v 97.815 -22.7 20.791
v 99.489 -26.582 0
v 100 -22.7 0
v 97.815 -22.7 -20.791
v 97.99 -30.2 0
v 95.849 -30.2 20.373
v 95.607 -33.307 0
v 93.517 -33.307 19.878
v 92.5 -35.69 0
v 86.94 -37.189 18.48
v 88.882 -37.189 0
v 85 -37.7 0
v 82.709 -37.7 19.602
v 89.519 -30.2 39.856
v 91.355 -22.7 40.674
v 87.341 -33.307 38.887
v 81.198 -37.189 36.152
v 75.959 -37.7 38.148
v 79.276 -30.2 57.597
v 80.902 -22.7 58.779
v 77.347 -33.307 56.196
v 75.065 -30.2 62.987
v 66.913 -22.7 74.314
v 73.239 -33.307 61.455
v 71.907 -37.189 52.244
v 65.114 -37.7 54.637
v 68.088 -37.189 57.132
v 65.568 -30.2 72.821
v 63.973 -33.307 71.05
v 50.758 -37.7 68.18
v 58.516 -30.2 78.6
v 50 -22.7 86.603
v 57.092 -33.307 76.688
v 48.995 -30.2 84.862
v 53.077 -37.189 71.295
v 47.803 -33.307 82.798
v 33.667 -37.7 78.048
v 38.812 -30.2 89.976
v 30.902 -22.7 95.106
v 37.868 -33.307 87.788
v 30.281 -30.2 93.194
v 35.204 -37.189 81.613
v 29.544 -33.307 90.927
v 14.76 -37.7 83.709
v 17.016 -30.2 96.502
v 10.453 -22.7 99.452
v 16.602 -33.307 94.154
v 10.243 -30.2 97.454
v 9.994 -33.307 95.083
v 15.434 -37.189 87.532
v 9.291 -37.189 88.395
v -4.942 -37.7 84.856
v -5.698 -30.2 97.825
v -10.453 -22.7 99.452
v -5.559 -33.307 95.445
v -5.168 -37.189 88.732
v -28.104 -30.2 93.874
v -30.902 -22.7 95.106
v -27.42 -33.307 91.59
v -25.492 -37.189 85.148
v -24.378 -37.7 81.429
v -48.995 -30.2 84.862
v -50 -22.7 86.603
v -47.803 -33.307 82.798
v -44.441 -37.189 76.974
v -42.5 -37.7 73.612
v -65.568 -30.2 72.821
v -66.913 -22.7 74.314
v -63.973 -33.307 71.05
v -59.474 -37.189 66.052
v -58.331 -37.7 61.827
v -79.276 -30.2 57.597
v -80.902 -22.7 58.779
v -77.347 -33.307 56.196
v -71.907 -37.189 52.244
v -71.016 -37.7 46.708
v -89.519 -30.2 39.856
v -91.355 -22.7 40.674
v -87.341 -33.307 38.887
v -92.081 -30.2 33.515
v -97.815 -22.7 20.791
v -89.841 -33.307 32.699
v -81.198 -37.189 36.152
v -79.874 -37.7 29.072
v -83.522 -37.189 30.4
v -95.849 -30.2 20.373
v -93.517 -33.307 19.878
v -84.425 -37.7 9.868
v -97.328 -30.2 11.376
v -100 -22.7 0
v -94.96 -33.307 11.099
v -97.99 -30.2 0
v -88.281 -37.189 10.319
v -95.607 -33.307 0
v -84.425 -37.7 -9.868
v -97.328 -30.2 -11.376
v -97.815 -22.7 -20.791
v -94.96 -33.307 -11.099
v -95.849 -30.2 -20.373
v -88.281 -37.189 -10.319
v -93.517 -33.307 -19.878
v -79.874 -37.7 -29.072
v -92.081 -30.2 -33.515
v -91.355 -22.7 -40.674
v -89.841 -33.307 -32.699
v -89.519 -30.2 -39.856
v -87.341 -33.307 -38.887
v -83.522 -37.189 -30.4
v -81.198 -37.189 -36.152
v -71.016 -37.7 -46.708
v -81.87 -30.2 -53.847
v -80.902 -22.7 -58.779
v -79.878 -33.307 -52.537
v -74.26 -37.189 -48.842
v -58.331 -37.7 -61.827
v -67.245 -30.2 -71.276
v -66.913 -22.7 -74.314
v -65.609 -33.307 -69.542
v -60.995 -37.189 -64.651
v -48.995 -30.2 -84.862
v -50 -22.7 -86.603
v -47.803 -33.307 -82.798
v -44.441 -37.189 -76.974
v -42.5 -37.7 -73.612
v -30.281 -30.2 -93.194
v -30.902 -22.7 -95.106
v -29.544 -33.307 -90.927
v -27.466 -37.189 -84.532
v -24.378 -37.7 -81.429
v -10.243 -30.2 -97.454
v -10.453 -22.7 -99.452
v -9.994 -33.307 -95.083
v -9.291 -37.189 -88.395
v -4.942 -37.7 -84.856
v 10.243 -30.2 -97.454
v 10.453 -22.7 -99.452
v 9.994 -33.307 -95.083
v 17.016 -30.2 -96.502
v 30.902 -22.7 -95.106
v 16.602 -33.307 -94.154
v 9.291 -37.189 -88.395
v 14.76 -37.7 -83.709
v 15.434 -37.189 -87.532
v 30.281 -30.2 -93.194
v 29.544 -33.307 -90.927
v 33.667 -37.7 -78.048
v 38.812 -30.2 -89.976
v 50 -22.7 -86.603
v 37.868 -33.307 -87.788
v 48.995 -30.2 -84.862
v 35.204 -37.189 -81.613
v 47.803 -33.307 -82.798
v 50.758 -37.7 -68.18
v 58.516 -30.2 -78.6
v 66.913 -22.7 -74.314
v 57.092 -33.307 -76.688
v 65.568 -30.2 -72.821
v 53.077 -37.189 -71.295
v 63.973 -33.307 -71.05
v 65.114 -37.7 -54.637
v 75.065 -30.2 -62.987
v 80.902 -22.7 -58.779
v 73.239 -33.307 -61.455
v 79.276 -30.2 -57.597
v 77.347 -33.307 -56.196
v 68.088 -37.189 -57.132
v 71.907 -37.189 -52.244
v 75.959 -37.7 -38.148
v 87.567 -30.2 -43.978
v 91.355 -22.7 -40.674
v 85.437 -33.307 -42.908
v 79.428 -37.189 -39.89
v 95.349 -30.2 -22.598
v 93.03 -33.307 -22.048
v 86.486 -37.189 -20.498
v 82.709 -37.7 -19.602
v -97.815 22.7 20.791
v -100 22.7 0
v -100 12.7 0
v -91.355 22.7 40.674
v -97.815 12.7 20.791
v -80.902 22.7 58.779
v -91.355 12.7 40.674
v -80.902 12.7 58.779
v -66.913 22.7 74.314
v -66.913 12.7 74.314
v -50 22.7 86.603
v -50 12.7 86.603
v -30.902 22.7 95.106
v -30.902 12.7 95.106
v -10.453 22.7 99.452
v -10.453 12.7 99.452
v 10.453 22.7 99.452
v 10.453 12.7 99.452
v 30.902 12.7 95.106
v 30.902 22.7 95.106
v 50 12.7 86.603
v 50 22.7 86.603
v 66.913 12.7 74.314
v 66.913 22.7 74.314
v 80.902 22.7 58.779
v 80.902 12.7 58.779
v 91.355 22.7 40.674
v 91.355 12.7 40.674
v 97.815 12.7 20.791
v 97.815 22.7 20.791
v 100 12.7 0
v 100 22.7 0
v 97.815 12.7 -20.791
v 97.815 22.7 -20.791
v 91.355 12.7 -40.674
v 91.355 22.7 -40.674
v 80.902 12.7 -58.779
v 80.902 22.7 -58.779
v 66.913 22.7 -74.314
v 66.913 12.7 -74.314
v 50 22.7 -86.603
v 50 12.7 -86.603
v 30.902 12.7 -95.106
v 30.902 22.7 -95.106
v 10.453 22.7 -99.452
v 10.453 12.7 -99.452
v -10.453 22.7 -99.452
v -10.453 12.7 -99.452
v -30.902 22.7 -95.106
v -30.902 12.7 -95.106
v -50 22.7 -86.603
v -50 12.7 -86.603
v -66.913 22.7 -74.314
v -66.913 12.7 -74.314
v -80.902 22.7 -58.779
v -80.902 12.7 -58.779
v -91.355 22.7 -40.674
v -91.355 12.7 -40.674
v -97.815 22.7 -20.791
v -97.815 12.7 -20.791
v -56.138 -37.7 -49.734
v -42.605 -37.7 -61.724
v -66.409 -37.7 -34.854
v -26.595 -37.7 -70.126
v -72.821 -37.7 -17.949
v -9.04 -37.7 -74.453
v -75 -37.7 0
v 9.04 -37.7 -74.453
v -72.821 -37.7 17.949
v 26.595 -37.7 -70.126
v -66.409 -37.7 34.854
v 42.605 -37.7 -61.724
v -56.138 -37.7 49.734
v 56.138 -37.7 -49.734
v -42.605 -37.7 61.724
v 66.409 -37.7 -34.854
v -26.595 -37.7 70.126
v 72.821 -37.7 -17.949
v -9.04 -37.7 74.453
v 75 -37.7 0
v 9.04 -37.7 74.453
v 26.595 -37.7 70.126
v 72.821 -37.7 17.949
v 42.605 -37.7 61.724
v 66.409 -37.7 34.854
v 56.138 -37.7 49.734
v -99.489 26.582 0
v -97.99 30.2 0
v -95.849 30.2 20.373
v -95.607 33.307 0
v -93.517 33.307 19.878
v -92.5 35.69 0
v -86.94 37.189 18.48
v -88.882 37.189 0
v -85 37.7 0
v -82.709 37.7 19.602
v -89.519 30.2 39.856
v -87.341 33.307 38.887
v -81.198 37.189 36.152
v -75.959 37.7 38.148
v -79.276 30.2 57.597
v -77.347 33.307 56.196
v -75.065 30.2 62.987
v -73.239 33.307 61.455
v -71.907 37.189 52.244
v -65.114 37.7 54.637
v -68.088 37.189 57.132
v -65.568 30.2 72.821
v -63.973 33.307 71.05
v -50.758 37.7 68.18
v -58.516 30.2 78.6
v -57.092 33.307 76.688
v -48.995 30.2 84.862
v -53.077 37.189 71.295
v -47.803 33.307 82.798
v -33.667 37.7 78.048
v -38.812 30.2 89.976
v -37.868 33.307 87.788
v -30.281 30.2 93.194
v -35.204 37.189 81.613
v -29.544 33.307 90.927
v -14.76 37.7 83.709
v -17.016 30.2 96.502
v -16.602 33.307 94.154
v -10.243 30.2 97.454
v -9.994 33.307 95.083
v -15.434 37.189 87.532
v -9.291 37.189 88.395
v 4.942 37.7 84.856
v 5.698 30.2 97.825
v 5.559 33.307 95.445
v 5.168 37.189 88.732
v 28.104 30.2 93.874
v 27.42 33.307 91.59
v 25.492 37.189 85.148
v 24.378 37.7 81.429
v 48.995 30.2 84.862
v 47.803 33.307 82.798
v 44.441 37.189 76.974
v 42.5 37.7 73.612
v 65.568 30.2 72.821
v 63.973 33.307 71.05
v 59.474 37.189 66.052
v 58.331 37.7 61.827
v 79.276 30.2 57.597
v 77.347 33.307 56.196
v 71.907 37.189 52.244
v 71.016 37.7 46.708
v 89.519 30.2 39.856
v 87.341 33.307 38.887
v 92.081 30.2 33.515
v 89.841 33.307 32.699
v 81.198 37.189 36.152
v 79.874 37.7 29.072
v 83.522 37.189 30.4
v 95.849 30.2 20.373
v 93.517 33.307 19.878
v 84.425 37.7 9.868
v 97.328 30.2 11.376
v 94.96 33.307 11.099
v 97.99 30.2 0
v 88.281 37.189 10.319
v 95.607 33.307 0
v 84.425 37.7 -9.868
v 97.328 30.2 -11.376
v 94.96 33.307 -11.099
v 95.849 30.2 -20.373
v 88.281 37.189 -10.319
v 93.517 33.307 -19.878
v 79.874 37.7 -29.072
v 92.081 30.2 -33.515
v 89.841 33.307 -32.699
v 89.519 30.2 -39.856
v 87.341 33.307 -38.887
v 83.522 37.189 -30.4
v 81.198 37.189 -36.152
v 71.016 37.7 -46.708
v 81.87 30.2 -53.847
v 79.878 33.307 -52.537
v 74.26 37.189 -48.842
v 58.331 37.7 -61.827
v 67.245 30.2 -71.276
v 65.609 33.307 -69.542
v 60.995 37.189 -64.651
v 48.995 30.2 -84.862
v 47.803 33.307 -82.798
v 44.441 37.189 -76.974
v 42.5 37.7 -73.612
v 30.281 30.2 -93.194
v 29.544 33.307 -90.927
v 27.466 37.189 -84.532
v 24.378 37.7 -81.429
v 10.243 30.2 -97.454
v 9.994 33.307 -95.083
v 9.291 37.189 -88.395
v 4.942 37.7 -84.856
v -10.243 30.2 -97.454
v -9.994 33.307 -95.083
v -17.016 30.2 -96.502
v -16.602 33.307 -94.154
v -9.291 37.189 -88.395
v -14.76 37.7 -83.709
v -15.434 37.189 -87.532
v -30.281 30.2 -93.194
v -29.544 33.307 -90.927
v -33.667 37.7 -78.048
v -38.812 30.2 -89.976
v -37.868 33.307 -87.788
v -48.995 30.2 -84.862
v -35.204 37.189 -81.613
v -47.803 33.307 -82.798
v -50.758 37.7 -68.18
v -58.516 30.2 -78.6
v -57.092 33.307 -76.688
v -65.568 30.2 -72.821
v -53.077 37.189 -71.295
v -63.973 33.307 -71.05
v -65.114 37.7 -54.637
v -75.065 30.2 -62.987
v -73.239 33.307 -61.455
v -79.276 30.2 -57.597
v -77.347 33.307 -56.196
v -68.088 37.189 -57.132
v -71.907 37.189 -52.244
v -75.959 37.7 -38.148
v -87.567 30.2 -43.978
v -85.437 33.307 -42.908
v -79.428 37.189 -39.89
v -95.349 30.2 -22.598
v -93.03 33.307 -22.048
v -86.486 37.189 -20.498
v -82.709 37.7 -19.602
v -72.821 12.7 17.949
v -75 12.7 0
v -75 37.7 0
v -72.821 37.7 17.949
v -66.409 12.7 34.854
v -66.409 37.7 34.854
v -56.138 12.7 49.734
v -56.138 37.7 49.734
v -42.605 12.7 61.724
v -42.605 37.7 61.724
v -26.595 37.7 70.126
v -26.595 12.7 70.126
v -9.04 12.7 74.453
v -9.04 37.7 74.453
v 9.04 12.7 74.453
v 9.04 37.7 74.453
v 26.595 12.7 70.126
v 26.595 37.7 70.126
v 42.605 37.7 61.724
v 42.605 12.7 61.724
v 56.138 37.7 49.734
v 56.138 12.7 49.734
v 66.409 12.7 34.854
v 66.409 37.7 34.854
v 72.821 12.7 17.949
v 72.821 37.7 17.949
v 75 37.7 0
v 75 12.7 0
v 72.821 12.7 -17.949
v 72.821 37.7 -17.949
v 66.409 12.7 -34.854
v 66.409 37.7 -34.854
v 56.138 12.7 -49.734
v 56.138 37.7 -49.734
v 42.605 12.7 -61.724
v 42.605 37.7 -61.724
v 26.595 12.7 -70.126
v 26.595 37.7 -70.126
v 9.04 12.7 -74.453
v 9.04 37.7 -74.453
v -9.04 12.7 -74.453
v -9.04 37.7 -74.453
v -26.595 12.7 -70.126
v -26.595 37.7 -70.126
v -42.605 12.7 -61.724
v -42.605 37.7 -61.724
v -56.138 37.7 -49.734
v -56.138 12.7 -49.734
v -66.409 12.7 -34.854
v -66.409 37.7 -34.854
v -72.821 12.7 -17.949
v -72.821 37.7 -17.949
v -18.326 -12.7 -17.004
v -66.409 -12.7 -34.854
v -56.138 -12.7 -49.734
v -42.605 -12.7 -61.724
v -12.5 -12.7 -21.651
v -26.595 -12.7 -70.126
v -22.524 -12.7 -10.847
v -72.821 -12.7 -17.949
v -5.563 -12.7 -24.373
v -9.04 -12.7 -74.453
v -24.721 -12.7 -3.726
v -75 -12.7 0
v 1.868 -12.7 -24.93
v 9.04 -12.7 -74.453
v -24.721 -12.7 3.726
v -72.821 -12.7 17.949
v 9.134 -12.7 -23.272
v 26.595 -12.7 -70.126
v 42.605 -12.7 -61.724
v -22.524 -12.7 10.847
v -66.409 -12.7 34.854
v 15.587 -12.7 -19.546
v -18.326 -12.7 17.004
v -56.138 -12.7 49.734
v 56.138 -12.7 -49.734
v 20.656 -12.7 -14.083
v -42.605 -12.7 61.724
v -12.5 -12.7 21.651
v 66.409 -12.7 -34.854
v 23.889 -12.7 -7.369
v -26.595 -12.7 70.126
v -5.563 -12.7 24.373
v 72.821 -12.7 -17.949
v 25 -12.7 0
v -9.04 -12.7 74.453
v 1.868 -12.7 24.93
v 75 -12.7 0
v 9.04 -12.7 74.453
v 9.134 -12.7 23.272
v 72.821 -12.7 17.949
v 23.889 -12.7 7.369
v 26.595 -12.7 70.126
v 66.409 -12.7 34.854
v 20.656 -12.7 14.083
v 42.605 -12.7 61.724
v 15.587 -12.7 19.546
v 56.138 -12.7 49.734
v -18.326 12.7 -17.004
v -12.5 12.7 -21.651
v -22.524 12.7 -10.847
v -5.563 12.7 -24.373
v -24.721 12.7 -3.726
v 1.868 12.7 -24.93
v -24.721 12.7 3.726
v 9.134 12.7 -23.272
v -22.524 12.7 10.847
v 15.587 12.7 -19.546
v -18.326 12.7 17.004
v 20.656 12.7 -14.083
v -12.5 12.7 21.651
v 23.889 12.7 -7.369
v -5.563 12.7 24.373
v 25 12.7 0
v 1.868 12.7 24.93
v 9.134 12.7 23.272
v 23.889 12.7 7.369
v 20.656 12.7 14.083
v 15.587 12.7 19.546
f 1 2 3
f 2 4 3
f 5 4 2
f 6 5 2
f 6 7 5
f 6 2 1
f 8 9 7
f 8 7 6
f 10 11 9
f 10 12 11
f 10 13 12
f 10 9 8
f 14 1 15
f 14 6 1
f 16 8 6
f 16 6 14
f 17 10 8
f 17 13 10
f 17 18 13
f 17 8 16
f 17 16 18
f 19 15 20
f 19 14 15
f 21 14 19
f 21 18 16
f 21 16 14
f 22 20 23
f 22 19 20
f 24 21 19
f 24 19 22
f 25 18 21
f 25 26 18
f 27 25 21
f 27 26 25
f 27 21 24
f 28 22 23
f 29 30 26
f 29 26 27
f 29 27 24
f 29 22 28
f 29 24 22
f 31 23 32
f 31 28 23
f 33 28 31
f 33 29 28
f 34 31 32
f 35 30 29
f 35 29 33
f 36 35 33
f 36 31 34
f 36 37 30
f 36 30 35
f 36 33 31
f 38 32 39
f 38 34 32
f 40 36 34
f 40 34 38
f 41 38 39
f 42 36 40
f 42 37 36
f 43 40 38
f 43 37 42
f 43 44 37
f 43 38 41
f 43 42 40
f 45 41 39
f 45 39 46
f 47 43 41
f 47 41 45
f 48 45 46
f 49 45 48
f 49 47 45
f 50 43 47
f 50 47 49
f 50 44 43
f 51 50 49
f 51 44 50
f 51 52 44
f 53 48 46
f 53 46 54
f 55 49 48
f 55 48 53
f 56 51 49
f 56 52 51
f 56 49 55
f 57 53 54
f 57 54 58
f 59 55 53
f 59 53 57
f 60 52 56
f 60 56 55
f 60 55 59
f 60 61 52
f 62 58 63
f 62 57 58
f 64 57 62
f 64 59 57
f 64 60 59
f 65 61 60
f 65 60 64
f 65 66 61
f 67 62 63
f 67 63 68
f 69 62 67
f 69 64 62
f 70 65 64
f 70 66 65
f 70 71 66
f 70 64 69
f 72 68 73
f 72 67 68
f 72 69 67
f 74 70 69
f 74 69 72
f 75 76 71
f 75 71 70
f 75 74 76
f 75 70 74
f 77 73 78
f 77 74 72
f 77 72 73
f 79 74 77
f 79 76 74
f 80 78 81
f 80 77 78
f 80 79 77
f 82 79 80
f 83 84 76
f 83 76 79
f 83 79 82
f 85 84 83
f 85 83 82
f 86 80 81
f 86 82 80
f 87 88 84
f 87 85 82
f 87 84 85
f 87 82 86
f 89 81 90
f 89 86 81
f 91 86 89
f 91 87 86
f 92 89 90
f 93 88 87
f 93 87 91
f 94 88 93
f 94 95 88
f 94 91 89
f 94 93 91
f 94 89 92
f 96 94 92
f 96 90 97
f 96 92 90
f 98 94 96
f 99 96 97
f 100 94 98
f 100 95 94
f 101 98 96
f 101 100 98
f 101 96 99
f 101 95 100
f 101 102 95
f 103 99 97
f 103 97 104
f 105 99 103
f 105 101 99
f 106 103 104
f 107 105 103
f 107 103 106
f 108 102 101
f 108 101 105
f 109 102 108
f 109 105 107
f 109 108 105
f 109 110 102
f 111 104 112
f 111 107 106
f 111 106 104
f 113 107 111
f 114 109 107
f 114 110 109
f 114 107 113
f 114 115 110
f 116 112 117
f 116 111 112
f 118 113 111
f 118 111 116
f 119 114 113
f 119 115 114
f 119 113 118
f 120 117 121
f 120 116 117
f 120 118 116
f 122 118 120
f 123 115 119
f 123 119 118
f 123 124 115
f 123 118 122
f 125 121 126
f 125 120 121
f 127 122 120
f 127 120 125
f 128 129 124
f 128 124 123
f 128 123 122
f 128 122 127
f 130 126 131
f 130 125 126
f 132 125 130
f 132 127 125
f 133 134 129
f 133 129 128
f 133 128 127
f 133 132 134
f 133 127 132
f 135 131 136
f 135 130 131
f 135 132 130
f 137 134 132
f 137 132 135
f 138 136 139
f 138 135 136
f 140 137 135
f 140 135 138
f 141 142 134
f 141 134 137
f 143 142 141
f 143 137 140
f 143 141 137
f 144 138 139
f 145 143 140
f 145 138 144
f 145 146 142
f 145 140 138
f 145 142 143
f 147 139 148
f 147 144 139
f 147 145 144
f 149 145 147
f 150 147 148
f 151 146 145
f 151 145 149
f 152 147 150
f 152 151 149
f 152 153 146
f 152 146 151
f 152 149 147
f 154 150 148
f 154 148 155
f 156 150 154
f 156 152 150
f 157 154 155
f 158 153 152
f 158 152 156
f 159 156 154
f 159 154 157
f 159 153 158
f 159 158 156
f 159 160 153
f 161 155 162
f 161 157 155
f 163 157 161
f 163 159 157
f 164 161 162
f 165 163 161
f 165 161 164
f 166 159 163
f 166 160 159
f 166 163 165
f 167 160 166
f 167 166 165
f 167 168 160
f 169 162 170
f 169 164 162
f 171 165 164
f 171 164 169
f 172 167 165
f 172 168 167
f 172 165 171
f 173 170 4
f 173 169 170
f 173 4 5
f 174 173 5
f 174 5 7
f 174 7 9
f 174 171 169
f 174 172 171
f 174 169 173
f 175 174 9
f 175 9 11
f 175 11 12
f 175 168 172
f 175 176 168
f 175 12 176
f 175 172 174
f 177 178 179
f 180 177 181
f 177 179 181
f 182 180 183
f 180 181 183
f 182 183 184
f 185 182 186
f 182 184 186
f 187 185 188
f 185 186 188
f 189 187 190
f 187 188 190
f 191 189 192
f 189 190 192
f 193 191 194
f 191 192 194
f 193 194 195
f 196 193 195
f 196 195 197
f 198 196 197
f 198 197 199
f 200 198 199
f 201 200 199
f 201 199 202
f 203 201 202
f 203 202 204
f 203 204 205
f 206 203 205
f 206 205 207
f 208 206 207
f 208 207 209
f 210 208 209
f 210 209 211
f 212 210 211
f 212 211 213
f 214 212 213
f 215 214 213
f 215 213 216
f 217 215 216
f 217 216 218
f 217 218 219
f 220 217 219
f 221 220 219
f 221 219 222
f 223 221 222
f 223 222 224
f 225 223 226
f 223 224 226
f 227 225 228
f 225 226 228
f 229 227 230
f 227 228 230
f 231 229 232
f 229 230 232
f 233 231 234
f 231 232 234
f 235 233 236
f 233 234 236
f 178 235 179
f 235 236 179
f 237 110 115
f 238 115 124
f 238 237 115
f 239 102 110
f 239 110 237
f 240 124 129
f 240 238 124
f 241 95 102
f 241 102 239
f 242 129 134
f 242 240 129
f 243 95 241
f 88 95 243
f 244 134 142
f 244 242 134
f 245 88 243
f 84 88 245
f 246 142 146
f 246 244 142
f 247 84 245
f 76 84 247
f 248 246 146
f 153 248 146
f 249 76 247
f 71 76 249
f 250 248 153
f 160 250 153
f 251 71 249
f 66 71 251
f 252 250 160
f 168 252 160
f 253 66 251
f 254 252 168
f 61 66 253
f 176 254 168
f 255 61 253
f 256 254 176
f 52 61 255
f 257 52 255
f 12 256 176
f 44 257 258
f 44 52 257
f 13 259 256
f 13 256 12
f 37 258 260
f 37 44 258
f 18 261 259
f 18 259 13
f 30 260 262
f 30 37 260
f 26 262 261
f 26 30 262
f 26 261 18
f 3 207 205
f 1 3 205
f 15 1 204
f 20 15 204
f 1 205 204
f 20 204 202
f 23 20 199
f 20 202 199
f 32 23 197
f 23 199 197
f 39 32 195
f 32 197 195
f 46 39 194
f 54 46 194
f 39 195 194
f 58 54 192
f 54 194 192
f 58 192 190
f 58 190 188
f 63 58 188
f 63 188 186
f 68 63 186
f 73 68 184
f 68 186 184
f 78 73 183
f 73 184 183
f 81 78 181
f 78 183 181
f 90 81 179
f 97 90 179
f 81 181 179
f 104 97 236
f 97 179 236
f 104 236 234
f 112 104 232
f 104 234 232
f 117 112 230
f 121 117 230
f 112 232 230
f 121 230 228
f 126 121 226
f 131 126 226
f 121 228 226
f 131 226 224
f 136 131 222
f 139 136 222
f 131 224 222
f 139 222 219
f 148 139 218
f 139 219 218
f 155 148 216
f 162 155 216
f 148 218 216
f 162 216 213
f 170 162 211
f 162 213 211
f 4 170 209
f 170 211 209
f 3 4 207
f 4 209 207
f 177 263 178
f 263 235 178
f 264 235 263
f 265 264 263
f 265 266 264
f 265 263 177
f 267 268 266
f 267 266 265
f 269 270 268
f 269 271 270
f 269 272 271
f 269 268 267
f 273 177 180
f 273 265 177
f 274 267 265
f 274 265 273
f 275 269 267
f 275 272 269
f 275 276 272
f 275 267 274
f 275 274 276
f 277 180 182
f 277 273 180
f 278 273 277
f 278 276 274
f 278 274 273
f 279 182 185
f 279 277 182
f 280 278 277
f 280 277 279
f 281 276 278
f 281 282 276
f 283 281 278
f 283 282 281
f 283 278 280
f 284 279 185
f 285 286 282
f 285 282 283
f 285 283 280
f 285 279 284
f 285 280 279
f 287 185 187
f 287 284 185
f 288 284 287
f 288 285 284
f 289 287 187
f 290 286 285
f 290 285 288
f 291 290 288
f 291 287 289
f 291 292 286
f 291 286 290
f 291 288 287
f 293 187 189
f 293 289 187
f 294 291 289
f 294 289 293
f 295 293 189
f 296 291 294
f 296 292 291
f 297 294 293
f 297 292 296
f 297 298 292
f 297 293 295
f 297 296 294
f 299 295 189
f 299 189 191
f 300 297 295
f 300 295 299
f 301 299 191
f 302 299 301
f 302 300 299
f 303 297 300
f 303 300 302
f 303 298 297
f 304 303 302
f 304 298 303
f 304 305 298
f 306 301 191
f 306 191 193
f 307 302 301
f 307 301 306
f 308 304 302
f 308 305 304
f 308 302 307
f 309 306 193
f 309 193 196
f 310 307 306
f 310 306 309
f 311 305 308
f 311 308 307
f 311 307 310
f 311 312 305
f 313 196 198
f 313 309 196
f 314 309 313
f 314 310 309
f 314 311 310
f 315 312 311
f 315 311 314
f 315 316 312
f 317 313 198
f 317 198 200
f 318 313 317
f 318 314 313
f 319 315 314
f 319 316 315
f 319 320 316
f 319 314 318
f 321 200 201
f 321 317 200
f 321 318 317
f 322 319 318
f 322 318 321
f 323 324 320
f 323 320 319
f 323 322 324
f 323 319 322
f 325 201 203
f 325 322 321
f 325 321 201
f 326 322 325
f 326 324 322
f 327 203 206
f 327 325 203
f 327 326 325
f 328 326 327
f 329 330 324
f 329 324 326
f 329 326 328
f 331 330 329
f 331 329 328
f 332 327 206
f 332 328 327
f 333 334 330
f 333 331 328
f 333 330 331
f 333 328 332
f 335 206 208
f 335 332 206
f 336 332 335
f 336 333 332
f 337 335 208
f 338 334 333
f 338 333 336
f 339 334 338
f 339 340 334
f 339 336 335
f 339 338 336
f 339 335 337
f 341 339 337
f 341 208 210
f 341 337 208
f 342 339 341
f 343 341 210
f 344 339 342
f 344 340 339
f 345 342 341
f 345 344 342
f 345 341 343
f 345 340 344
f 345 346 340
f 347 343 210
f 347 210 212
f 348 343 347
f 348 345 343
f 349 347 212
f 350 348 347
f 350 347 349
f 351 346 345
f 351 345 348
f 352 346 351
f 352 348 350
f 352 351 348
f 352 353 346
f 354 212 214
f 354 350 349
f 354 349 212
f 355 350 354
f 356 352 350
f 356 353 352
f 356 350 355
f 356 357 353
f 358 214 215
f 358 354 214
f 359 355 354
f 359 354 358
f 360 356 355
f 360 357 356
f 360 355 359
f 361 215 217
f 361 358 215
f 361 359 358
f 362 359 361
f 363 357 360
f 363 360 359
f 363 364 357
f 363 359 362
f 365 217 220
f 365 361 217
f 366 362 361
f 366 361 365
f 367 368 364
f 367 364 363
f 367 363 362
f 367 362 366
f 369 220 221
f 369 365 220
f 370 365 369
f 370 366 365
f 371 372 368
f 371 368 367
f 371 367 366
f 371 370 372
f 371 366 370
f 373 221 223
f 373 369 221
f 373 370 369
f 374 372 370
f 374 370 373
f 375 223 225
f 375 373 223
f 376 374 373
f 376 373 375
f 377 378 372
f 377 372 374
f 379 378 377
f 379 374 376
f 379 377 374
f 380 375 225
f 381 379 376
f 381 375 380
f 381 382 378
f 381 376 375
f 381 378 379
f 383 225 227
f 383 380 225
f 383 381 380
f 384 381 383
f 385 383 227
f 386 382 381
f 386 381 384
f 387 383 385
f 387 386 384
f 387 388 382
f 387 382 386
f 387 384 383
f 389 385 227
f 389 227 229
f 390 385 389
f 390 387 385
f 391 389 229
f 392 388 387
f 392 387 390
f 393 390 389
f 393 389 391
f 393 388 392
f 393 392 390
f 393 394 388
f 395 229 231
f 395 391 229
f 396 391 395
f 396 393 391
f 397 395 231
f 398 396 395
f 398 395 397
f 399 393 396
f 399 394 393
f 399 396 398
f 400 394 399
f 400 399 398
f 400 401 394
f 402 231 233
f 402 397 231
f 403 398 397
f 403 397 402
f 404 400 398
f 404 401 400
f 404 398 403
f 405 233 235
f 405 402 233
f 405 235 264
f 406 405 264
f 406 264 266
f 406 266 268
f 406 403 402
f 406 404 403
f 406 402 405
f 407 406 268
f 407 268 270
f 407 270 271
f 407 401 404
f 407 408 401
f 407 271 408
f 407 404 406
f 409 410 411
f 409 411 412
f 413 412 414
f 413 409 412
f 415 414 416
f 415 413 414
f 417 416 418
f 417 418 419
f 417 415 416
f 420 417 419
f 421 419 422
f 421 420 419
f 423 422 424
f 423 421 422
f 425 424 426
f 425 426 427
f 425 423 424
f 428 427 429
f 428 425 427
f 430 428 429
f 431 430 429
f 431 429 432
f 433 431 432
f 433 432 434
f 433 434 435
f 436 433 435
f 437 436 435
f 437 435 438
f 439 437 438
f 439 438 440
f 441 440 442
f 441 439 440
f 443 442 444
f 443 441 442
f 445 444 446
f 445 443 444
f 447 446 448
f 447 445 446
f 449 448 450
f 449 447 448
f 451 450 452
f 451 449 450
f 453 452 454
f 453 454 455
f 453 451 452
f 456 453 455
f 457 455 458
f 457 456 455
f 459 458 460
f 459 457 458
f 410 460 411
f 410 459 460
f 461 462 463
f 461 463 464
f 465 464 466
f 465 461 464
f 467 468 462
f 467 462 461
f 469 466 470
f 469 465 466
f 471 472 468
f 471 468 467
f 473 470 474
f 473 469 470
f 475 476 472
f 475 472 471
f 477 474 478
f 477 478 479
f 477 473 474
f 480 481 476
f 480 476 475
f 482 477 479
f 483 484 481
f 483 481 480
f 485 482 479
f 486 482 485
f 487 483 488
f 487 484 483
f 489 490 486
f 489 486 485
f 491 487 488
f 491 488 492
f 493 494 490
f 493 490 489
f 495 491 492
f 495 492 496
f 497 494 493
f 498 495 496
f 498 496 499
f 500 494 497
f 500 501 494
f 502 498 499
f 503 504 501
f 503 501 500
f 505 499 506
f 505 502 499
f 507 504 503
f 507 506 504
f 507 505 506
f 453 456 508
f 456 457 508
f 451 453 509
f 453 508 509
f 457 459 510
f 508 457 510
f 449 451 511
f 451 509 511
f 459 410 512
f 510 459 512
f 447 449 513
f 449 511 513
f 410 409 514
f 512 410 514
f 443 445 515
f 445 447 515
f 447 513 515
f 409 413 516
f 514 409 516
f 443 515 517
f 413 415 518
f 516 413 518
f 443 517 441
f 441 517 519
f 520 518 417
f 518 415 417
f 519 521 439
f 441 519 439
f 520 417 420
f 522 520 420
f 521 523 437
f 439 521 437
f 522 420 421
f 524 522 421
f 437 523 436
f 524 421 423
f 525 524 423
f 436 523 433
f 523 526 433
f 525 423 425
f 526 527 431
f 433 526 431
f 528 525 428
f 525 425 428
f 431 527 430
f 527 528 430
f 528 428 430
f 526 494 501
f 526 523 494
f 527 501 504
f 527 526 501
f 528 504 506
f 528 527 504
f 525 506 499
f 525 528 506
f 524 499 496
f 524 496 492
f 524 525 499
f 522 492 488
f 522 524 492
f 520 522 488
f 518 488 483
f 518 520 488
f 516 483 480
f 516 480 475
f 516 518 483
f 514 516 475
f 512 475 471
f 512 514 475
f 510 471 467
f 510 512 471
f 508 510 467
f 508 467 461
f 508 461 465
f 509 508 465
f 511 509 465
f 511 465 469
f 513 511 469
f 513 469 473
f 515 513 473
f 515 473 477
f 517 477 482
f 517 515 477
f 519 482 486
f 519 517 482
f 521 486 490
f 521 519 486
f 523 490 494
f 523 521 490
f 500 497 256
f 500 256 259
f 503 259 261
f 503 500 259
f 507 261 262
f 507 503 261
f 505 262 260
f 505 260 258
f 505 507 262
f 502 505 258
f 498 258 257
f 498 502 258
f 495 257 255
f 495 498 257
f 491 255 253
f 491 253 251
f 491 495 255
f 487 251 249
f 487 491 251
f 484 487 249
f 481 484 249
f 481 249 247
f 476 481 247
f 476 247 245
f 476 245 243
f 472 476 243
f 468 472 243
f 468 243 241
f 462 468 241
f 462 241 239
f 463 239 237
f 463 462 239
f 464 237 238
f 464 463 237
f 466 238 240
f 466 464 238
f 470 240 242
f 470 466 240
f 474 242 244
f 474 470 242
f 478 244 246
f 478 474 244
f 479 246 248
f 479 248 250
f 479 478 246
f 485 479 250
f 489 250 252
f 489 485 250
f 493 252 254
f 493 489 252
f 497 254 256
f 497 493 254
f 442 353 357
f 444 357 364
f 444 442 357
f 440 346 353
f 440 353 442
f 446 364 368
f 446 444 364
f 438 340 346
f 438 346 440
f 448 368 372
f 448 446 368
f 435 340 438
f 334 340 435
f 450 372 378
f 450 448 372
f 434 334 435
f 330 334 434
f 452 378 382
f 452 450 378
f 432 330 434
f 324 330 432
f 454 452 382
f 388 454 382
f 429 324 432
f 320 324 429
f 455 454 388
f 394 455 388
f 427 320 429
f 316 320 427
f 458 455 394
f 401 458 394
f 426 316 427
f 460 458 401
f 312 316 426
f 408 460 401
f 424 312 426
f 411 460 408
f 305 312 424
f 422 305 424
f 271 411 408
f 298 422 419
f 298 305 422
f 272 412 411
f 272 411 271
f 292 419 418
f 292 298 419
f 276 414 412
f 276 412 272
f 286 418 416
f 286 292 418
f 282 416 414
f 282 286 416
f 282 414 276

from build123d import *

# Parameters (mm, degrees)
F0_R     = 100
F0_R_2   = 75
F0_R_3   = 25
F1_DEPTH = 12.7
F2_R     = 100
F2_R_2   = 75
F3_DEPTH = 25
F4_R     = 100
F4_R_2   = 75
F5_DEPTH = 25
F6_R     = 15


with BuildPart() as f1:
    # F0 (on Front) → F1 (new body, symmetric)
    with BuildSketch(Plane.XZ):
        Circle(F0_R)
        Circle(F0_R_2, mode=Mode.SUBTRACT)
        Circle(F0_R_2)
        Circle(F0_R_3, mode=Mode.SUBTRACT)
    extrude(amount=F1_DEPTH, both=True)

    # F2 (on face) → F3 (join)
    with BuildSketch(Plane.XZ.offset(12.7)):
        Circle(F2_R)
        Circle(F2_R_2, mode=Mode.SUBTRACT)
    extrude(amount=F3_DEPTH)

    # F4 (on face) → F5 (join)
    with BuildSketch(Plane(origin=(0, 12.7, 0), x_dir=(-1, 0, 0), z_dir=(0, 1, 0))):
        Circle(F4_R)
        Circle(F4_R_2, mode=Mode.SUBTRACT)
    extrude(amount=F5_DEPTH)

    # F6
    f6_edges = [f1.edges().sort_by_distance(p)[0] for p in [
        (100, 37.7, 0),
        (-100, -37.7, 0),
    ]]
    fillet(f6_edges, radius=F6_R)


solid = f1.part
